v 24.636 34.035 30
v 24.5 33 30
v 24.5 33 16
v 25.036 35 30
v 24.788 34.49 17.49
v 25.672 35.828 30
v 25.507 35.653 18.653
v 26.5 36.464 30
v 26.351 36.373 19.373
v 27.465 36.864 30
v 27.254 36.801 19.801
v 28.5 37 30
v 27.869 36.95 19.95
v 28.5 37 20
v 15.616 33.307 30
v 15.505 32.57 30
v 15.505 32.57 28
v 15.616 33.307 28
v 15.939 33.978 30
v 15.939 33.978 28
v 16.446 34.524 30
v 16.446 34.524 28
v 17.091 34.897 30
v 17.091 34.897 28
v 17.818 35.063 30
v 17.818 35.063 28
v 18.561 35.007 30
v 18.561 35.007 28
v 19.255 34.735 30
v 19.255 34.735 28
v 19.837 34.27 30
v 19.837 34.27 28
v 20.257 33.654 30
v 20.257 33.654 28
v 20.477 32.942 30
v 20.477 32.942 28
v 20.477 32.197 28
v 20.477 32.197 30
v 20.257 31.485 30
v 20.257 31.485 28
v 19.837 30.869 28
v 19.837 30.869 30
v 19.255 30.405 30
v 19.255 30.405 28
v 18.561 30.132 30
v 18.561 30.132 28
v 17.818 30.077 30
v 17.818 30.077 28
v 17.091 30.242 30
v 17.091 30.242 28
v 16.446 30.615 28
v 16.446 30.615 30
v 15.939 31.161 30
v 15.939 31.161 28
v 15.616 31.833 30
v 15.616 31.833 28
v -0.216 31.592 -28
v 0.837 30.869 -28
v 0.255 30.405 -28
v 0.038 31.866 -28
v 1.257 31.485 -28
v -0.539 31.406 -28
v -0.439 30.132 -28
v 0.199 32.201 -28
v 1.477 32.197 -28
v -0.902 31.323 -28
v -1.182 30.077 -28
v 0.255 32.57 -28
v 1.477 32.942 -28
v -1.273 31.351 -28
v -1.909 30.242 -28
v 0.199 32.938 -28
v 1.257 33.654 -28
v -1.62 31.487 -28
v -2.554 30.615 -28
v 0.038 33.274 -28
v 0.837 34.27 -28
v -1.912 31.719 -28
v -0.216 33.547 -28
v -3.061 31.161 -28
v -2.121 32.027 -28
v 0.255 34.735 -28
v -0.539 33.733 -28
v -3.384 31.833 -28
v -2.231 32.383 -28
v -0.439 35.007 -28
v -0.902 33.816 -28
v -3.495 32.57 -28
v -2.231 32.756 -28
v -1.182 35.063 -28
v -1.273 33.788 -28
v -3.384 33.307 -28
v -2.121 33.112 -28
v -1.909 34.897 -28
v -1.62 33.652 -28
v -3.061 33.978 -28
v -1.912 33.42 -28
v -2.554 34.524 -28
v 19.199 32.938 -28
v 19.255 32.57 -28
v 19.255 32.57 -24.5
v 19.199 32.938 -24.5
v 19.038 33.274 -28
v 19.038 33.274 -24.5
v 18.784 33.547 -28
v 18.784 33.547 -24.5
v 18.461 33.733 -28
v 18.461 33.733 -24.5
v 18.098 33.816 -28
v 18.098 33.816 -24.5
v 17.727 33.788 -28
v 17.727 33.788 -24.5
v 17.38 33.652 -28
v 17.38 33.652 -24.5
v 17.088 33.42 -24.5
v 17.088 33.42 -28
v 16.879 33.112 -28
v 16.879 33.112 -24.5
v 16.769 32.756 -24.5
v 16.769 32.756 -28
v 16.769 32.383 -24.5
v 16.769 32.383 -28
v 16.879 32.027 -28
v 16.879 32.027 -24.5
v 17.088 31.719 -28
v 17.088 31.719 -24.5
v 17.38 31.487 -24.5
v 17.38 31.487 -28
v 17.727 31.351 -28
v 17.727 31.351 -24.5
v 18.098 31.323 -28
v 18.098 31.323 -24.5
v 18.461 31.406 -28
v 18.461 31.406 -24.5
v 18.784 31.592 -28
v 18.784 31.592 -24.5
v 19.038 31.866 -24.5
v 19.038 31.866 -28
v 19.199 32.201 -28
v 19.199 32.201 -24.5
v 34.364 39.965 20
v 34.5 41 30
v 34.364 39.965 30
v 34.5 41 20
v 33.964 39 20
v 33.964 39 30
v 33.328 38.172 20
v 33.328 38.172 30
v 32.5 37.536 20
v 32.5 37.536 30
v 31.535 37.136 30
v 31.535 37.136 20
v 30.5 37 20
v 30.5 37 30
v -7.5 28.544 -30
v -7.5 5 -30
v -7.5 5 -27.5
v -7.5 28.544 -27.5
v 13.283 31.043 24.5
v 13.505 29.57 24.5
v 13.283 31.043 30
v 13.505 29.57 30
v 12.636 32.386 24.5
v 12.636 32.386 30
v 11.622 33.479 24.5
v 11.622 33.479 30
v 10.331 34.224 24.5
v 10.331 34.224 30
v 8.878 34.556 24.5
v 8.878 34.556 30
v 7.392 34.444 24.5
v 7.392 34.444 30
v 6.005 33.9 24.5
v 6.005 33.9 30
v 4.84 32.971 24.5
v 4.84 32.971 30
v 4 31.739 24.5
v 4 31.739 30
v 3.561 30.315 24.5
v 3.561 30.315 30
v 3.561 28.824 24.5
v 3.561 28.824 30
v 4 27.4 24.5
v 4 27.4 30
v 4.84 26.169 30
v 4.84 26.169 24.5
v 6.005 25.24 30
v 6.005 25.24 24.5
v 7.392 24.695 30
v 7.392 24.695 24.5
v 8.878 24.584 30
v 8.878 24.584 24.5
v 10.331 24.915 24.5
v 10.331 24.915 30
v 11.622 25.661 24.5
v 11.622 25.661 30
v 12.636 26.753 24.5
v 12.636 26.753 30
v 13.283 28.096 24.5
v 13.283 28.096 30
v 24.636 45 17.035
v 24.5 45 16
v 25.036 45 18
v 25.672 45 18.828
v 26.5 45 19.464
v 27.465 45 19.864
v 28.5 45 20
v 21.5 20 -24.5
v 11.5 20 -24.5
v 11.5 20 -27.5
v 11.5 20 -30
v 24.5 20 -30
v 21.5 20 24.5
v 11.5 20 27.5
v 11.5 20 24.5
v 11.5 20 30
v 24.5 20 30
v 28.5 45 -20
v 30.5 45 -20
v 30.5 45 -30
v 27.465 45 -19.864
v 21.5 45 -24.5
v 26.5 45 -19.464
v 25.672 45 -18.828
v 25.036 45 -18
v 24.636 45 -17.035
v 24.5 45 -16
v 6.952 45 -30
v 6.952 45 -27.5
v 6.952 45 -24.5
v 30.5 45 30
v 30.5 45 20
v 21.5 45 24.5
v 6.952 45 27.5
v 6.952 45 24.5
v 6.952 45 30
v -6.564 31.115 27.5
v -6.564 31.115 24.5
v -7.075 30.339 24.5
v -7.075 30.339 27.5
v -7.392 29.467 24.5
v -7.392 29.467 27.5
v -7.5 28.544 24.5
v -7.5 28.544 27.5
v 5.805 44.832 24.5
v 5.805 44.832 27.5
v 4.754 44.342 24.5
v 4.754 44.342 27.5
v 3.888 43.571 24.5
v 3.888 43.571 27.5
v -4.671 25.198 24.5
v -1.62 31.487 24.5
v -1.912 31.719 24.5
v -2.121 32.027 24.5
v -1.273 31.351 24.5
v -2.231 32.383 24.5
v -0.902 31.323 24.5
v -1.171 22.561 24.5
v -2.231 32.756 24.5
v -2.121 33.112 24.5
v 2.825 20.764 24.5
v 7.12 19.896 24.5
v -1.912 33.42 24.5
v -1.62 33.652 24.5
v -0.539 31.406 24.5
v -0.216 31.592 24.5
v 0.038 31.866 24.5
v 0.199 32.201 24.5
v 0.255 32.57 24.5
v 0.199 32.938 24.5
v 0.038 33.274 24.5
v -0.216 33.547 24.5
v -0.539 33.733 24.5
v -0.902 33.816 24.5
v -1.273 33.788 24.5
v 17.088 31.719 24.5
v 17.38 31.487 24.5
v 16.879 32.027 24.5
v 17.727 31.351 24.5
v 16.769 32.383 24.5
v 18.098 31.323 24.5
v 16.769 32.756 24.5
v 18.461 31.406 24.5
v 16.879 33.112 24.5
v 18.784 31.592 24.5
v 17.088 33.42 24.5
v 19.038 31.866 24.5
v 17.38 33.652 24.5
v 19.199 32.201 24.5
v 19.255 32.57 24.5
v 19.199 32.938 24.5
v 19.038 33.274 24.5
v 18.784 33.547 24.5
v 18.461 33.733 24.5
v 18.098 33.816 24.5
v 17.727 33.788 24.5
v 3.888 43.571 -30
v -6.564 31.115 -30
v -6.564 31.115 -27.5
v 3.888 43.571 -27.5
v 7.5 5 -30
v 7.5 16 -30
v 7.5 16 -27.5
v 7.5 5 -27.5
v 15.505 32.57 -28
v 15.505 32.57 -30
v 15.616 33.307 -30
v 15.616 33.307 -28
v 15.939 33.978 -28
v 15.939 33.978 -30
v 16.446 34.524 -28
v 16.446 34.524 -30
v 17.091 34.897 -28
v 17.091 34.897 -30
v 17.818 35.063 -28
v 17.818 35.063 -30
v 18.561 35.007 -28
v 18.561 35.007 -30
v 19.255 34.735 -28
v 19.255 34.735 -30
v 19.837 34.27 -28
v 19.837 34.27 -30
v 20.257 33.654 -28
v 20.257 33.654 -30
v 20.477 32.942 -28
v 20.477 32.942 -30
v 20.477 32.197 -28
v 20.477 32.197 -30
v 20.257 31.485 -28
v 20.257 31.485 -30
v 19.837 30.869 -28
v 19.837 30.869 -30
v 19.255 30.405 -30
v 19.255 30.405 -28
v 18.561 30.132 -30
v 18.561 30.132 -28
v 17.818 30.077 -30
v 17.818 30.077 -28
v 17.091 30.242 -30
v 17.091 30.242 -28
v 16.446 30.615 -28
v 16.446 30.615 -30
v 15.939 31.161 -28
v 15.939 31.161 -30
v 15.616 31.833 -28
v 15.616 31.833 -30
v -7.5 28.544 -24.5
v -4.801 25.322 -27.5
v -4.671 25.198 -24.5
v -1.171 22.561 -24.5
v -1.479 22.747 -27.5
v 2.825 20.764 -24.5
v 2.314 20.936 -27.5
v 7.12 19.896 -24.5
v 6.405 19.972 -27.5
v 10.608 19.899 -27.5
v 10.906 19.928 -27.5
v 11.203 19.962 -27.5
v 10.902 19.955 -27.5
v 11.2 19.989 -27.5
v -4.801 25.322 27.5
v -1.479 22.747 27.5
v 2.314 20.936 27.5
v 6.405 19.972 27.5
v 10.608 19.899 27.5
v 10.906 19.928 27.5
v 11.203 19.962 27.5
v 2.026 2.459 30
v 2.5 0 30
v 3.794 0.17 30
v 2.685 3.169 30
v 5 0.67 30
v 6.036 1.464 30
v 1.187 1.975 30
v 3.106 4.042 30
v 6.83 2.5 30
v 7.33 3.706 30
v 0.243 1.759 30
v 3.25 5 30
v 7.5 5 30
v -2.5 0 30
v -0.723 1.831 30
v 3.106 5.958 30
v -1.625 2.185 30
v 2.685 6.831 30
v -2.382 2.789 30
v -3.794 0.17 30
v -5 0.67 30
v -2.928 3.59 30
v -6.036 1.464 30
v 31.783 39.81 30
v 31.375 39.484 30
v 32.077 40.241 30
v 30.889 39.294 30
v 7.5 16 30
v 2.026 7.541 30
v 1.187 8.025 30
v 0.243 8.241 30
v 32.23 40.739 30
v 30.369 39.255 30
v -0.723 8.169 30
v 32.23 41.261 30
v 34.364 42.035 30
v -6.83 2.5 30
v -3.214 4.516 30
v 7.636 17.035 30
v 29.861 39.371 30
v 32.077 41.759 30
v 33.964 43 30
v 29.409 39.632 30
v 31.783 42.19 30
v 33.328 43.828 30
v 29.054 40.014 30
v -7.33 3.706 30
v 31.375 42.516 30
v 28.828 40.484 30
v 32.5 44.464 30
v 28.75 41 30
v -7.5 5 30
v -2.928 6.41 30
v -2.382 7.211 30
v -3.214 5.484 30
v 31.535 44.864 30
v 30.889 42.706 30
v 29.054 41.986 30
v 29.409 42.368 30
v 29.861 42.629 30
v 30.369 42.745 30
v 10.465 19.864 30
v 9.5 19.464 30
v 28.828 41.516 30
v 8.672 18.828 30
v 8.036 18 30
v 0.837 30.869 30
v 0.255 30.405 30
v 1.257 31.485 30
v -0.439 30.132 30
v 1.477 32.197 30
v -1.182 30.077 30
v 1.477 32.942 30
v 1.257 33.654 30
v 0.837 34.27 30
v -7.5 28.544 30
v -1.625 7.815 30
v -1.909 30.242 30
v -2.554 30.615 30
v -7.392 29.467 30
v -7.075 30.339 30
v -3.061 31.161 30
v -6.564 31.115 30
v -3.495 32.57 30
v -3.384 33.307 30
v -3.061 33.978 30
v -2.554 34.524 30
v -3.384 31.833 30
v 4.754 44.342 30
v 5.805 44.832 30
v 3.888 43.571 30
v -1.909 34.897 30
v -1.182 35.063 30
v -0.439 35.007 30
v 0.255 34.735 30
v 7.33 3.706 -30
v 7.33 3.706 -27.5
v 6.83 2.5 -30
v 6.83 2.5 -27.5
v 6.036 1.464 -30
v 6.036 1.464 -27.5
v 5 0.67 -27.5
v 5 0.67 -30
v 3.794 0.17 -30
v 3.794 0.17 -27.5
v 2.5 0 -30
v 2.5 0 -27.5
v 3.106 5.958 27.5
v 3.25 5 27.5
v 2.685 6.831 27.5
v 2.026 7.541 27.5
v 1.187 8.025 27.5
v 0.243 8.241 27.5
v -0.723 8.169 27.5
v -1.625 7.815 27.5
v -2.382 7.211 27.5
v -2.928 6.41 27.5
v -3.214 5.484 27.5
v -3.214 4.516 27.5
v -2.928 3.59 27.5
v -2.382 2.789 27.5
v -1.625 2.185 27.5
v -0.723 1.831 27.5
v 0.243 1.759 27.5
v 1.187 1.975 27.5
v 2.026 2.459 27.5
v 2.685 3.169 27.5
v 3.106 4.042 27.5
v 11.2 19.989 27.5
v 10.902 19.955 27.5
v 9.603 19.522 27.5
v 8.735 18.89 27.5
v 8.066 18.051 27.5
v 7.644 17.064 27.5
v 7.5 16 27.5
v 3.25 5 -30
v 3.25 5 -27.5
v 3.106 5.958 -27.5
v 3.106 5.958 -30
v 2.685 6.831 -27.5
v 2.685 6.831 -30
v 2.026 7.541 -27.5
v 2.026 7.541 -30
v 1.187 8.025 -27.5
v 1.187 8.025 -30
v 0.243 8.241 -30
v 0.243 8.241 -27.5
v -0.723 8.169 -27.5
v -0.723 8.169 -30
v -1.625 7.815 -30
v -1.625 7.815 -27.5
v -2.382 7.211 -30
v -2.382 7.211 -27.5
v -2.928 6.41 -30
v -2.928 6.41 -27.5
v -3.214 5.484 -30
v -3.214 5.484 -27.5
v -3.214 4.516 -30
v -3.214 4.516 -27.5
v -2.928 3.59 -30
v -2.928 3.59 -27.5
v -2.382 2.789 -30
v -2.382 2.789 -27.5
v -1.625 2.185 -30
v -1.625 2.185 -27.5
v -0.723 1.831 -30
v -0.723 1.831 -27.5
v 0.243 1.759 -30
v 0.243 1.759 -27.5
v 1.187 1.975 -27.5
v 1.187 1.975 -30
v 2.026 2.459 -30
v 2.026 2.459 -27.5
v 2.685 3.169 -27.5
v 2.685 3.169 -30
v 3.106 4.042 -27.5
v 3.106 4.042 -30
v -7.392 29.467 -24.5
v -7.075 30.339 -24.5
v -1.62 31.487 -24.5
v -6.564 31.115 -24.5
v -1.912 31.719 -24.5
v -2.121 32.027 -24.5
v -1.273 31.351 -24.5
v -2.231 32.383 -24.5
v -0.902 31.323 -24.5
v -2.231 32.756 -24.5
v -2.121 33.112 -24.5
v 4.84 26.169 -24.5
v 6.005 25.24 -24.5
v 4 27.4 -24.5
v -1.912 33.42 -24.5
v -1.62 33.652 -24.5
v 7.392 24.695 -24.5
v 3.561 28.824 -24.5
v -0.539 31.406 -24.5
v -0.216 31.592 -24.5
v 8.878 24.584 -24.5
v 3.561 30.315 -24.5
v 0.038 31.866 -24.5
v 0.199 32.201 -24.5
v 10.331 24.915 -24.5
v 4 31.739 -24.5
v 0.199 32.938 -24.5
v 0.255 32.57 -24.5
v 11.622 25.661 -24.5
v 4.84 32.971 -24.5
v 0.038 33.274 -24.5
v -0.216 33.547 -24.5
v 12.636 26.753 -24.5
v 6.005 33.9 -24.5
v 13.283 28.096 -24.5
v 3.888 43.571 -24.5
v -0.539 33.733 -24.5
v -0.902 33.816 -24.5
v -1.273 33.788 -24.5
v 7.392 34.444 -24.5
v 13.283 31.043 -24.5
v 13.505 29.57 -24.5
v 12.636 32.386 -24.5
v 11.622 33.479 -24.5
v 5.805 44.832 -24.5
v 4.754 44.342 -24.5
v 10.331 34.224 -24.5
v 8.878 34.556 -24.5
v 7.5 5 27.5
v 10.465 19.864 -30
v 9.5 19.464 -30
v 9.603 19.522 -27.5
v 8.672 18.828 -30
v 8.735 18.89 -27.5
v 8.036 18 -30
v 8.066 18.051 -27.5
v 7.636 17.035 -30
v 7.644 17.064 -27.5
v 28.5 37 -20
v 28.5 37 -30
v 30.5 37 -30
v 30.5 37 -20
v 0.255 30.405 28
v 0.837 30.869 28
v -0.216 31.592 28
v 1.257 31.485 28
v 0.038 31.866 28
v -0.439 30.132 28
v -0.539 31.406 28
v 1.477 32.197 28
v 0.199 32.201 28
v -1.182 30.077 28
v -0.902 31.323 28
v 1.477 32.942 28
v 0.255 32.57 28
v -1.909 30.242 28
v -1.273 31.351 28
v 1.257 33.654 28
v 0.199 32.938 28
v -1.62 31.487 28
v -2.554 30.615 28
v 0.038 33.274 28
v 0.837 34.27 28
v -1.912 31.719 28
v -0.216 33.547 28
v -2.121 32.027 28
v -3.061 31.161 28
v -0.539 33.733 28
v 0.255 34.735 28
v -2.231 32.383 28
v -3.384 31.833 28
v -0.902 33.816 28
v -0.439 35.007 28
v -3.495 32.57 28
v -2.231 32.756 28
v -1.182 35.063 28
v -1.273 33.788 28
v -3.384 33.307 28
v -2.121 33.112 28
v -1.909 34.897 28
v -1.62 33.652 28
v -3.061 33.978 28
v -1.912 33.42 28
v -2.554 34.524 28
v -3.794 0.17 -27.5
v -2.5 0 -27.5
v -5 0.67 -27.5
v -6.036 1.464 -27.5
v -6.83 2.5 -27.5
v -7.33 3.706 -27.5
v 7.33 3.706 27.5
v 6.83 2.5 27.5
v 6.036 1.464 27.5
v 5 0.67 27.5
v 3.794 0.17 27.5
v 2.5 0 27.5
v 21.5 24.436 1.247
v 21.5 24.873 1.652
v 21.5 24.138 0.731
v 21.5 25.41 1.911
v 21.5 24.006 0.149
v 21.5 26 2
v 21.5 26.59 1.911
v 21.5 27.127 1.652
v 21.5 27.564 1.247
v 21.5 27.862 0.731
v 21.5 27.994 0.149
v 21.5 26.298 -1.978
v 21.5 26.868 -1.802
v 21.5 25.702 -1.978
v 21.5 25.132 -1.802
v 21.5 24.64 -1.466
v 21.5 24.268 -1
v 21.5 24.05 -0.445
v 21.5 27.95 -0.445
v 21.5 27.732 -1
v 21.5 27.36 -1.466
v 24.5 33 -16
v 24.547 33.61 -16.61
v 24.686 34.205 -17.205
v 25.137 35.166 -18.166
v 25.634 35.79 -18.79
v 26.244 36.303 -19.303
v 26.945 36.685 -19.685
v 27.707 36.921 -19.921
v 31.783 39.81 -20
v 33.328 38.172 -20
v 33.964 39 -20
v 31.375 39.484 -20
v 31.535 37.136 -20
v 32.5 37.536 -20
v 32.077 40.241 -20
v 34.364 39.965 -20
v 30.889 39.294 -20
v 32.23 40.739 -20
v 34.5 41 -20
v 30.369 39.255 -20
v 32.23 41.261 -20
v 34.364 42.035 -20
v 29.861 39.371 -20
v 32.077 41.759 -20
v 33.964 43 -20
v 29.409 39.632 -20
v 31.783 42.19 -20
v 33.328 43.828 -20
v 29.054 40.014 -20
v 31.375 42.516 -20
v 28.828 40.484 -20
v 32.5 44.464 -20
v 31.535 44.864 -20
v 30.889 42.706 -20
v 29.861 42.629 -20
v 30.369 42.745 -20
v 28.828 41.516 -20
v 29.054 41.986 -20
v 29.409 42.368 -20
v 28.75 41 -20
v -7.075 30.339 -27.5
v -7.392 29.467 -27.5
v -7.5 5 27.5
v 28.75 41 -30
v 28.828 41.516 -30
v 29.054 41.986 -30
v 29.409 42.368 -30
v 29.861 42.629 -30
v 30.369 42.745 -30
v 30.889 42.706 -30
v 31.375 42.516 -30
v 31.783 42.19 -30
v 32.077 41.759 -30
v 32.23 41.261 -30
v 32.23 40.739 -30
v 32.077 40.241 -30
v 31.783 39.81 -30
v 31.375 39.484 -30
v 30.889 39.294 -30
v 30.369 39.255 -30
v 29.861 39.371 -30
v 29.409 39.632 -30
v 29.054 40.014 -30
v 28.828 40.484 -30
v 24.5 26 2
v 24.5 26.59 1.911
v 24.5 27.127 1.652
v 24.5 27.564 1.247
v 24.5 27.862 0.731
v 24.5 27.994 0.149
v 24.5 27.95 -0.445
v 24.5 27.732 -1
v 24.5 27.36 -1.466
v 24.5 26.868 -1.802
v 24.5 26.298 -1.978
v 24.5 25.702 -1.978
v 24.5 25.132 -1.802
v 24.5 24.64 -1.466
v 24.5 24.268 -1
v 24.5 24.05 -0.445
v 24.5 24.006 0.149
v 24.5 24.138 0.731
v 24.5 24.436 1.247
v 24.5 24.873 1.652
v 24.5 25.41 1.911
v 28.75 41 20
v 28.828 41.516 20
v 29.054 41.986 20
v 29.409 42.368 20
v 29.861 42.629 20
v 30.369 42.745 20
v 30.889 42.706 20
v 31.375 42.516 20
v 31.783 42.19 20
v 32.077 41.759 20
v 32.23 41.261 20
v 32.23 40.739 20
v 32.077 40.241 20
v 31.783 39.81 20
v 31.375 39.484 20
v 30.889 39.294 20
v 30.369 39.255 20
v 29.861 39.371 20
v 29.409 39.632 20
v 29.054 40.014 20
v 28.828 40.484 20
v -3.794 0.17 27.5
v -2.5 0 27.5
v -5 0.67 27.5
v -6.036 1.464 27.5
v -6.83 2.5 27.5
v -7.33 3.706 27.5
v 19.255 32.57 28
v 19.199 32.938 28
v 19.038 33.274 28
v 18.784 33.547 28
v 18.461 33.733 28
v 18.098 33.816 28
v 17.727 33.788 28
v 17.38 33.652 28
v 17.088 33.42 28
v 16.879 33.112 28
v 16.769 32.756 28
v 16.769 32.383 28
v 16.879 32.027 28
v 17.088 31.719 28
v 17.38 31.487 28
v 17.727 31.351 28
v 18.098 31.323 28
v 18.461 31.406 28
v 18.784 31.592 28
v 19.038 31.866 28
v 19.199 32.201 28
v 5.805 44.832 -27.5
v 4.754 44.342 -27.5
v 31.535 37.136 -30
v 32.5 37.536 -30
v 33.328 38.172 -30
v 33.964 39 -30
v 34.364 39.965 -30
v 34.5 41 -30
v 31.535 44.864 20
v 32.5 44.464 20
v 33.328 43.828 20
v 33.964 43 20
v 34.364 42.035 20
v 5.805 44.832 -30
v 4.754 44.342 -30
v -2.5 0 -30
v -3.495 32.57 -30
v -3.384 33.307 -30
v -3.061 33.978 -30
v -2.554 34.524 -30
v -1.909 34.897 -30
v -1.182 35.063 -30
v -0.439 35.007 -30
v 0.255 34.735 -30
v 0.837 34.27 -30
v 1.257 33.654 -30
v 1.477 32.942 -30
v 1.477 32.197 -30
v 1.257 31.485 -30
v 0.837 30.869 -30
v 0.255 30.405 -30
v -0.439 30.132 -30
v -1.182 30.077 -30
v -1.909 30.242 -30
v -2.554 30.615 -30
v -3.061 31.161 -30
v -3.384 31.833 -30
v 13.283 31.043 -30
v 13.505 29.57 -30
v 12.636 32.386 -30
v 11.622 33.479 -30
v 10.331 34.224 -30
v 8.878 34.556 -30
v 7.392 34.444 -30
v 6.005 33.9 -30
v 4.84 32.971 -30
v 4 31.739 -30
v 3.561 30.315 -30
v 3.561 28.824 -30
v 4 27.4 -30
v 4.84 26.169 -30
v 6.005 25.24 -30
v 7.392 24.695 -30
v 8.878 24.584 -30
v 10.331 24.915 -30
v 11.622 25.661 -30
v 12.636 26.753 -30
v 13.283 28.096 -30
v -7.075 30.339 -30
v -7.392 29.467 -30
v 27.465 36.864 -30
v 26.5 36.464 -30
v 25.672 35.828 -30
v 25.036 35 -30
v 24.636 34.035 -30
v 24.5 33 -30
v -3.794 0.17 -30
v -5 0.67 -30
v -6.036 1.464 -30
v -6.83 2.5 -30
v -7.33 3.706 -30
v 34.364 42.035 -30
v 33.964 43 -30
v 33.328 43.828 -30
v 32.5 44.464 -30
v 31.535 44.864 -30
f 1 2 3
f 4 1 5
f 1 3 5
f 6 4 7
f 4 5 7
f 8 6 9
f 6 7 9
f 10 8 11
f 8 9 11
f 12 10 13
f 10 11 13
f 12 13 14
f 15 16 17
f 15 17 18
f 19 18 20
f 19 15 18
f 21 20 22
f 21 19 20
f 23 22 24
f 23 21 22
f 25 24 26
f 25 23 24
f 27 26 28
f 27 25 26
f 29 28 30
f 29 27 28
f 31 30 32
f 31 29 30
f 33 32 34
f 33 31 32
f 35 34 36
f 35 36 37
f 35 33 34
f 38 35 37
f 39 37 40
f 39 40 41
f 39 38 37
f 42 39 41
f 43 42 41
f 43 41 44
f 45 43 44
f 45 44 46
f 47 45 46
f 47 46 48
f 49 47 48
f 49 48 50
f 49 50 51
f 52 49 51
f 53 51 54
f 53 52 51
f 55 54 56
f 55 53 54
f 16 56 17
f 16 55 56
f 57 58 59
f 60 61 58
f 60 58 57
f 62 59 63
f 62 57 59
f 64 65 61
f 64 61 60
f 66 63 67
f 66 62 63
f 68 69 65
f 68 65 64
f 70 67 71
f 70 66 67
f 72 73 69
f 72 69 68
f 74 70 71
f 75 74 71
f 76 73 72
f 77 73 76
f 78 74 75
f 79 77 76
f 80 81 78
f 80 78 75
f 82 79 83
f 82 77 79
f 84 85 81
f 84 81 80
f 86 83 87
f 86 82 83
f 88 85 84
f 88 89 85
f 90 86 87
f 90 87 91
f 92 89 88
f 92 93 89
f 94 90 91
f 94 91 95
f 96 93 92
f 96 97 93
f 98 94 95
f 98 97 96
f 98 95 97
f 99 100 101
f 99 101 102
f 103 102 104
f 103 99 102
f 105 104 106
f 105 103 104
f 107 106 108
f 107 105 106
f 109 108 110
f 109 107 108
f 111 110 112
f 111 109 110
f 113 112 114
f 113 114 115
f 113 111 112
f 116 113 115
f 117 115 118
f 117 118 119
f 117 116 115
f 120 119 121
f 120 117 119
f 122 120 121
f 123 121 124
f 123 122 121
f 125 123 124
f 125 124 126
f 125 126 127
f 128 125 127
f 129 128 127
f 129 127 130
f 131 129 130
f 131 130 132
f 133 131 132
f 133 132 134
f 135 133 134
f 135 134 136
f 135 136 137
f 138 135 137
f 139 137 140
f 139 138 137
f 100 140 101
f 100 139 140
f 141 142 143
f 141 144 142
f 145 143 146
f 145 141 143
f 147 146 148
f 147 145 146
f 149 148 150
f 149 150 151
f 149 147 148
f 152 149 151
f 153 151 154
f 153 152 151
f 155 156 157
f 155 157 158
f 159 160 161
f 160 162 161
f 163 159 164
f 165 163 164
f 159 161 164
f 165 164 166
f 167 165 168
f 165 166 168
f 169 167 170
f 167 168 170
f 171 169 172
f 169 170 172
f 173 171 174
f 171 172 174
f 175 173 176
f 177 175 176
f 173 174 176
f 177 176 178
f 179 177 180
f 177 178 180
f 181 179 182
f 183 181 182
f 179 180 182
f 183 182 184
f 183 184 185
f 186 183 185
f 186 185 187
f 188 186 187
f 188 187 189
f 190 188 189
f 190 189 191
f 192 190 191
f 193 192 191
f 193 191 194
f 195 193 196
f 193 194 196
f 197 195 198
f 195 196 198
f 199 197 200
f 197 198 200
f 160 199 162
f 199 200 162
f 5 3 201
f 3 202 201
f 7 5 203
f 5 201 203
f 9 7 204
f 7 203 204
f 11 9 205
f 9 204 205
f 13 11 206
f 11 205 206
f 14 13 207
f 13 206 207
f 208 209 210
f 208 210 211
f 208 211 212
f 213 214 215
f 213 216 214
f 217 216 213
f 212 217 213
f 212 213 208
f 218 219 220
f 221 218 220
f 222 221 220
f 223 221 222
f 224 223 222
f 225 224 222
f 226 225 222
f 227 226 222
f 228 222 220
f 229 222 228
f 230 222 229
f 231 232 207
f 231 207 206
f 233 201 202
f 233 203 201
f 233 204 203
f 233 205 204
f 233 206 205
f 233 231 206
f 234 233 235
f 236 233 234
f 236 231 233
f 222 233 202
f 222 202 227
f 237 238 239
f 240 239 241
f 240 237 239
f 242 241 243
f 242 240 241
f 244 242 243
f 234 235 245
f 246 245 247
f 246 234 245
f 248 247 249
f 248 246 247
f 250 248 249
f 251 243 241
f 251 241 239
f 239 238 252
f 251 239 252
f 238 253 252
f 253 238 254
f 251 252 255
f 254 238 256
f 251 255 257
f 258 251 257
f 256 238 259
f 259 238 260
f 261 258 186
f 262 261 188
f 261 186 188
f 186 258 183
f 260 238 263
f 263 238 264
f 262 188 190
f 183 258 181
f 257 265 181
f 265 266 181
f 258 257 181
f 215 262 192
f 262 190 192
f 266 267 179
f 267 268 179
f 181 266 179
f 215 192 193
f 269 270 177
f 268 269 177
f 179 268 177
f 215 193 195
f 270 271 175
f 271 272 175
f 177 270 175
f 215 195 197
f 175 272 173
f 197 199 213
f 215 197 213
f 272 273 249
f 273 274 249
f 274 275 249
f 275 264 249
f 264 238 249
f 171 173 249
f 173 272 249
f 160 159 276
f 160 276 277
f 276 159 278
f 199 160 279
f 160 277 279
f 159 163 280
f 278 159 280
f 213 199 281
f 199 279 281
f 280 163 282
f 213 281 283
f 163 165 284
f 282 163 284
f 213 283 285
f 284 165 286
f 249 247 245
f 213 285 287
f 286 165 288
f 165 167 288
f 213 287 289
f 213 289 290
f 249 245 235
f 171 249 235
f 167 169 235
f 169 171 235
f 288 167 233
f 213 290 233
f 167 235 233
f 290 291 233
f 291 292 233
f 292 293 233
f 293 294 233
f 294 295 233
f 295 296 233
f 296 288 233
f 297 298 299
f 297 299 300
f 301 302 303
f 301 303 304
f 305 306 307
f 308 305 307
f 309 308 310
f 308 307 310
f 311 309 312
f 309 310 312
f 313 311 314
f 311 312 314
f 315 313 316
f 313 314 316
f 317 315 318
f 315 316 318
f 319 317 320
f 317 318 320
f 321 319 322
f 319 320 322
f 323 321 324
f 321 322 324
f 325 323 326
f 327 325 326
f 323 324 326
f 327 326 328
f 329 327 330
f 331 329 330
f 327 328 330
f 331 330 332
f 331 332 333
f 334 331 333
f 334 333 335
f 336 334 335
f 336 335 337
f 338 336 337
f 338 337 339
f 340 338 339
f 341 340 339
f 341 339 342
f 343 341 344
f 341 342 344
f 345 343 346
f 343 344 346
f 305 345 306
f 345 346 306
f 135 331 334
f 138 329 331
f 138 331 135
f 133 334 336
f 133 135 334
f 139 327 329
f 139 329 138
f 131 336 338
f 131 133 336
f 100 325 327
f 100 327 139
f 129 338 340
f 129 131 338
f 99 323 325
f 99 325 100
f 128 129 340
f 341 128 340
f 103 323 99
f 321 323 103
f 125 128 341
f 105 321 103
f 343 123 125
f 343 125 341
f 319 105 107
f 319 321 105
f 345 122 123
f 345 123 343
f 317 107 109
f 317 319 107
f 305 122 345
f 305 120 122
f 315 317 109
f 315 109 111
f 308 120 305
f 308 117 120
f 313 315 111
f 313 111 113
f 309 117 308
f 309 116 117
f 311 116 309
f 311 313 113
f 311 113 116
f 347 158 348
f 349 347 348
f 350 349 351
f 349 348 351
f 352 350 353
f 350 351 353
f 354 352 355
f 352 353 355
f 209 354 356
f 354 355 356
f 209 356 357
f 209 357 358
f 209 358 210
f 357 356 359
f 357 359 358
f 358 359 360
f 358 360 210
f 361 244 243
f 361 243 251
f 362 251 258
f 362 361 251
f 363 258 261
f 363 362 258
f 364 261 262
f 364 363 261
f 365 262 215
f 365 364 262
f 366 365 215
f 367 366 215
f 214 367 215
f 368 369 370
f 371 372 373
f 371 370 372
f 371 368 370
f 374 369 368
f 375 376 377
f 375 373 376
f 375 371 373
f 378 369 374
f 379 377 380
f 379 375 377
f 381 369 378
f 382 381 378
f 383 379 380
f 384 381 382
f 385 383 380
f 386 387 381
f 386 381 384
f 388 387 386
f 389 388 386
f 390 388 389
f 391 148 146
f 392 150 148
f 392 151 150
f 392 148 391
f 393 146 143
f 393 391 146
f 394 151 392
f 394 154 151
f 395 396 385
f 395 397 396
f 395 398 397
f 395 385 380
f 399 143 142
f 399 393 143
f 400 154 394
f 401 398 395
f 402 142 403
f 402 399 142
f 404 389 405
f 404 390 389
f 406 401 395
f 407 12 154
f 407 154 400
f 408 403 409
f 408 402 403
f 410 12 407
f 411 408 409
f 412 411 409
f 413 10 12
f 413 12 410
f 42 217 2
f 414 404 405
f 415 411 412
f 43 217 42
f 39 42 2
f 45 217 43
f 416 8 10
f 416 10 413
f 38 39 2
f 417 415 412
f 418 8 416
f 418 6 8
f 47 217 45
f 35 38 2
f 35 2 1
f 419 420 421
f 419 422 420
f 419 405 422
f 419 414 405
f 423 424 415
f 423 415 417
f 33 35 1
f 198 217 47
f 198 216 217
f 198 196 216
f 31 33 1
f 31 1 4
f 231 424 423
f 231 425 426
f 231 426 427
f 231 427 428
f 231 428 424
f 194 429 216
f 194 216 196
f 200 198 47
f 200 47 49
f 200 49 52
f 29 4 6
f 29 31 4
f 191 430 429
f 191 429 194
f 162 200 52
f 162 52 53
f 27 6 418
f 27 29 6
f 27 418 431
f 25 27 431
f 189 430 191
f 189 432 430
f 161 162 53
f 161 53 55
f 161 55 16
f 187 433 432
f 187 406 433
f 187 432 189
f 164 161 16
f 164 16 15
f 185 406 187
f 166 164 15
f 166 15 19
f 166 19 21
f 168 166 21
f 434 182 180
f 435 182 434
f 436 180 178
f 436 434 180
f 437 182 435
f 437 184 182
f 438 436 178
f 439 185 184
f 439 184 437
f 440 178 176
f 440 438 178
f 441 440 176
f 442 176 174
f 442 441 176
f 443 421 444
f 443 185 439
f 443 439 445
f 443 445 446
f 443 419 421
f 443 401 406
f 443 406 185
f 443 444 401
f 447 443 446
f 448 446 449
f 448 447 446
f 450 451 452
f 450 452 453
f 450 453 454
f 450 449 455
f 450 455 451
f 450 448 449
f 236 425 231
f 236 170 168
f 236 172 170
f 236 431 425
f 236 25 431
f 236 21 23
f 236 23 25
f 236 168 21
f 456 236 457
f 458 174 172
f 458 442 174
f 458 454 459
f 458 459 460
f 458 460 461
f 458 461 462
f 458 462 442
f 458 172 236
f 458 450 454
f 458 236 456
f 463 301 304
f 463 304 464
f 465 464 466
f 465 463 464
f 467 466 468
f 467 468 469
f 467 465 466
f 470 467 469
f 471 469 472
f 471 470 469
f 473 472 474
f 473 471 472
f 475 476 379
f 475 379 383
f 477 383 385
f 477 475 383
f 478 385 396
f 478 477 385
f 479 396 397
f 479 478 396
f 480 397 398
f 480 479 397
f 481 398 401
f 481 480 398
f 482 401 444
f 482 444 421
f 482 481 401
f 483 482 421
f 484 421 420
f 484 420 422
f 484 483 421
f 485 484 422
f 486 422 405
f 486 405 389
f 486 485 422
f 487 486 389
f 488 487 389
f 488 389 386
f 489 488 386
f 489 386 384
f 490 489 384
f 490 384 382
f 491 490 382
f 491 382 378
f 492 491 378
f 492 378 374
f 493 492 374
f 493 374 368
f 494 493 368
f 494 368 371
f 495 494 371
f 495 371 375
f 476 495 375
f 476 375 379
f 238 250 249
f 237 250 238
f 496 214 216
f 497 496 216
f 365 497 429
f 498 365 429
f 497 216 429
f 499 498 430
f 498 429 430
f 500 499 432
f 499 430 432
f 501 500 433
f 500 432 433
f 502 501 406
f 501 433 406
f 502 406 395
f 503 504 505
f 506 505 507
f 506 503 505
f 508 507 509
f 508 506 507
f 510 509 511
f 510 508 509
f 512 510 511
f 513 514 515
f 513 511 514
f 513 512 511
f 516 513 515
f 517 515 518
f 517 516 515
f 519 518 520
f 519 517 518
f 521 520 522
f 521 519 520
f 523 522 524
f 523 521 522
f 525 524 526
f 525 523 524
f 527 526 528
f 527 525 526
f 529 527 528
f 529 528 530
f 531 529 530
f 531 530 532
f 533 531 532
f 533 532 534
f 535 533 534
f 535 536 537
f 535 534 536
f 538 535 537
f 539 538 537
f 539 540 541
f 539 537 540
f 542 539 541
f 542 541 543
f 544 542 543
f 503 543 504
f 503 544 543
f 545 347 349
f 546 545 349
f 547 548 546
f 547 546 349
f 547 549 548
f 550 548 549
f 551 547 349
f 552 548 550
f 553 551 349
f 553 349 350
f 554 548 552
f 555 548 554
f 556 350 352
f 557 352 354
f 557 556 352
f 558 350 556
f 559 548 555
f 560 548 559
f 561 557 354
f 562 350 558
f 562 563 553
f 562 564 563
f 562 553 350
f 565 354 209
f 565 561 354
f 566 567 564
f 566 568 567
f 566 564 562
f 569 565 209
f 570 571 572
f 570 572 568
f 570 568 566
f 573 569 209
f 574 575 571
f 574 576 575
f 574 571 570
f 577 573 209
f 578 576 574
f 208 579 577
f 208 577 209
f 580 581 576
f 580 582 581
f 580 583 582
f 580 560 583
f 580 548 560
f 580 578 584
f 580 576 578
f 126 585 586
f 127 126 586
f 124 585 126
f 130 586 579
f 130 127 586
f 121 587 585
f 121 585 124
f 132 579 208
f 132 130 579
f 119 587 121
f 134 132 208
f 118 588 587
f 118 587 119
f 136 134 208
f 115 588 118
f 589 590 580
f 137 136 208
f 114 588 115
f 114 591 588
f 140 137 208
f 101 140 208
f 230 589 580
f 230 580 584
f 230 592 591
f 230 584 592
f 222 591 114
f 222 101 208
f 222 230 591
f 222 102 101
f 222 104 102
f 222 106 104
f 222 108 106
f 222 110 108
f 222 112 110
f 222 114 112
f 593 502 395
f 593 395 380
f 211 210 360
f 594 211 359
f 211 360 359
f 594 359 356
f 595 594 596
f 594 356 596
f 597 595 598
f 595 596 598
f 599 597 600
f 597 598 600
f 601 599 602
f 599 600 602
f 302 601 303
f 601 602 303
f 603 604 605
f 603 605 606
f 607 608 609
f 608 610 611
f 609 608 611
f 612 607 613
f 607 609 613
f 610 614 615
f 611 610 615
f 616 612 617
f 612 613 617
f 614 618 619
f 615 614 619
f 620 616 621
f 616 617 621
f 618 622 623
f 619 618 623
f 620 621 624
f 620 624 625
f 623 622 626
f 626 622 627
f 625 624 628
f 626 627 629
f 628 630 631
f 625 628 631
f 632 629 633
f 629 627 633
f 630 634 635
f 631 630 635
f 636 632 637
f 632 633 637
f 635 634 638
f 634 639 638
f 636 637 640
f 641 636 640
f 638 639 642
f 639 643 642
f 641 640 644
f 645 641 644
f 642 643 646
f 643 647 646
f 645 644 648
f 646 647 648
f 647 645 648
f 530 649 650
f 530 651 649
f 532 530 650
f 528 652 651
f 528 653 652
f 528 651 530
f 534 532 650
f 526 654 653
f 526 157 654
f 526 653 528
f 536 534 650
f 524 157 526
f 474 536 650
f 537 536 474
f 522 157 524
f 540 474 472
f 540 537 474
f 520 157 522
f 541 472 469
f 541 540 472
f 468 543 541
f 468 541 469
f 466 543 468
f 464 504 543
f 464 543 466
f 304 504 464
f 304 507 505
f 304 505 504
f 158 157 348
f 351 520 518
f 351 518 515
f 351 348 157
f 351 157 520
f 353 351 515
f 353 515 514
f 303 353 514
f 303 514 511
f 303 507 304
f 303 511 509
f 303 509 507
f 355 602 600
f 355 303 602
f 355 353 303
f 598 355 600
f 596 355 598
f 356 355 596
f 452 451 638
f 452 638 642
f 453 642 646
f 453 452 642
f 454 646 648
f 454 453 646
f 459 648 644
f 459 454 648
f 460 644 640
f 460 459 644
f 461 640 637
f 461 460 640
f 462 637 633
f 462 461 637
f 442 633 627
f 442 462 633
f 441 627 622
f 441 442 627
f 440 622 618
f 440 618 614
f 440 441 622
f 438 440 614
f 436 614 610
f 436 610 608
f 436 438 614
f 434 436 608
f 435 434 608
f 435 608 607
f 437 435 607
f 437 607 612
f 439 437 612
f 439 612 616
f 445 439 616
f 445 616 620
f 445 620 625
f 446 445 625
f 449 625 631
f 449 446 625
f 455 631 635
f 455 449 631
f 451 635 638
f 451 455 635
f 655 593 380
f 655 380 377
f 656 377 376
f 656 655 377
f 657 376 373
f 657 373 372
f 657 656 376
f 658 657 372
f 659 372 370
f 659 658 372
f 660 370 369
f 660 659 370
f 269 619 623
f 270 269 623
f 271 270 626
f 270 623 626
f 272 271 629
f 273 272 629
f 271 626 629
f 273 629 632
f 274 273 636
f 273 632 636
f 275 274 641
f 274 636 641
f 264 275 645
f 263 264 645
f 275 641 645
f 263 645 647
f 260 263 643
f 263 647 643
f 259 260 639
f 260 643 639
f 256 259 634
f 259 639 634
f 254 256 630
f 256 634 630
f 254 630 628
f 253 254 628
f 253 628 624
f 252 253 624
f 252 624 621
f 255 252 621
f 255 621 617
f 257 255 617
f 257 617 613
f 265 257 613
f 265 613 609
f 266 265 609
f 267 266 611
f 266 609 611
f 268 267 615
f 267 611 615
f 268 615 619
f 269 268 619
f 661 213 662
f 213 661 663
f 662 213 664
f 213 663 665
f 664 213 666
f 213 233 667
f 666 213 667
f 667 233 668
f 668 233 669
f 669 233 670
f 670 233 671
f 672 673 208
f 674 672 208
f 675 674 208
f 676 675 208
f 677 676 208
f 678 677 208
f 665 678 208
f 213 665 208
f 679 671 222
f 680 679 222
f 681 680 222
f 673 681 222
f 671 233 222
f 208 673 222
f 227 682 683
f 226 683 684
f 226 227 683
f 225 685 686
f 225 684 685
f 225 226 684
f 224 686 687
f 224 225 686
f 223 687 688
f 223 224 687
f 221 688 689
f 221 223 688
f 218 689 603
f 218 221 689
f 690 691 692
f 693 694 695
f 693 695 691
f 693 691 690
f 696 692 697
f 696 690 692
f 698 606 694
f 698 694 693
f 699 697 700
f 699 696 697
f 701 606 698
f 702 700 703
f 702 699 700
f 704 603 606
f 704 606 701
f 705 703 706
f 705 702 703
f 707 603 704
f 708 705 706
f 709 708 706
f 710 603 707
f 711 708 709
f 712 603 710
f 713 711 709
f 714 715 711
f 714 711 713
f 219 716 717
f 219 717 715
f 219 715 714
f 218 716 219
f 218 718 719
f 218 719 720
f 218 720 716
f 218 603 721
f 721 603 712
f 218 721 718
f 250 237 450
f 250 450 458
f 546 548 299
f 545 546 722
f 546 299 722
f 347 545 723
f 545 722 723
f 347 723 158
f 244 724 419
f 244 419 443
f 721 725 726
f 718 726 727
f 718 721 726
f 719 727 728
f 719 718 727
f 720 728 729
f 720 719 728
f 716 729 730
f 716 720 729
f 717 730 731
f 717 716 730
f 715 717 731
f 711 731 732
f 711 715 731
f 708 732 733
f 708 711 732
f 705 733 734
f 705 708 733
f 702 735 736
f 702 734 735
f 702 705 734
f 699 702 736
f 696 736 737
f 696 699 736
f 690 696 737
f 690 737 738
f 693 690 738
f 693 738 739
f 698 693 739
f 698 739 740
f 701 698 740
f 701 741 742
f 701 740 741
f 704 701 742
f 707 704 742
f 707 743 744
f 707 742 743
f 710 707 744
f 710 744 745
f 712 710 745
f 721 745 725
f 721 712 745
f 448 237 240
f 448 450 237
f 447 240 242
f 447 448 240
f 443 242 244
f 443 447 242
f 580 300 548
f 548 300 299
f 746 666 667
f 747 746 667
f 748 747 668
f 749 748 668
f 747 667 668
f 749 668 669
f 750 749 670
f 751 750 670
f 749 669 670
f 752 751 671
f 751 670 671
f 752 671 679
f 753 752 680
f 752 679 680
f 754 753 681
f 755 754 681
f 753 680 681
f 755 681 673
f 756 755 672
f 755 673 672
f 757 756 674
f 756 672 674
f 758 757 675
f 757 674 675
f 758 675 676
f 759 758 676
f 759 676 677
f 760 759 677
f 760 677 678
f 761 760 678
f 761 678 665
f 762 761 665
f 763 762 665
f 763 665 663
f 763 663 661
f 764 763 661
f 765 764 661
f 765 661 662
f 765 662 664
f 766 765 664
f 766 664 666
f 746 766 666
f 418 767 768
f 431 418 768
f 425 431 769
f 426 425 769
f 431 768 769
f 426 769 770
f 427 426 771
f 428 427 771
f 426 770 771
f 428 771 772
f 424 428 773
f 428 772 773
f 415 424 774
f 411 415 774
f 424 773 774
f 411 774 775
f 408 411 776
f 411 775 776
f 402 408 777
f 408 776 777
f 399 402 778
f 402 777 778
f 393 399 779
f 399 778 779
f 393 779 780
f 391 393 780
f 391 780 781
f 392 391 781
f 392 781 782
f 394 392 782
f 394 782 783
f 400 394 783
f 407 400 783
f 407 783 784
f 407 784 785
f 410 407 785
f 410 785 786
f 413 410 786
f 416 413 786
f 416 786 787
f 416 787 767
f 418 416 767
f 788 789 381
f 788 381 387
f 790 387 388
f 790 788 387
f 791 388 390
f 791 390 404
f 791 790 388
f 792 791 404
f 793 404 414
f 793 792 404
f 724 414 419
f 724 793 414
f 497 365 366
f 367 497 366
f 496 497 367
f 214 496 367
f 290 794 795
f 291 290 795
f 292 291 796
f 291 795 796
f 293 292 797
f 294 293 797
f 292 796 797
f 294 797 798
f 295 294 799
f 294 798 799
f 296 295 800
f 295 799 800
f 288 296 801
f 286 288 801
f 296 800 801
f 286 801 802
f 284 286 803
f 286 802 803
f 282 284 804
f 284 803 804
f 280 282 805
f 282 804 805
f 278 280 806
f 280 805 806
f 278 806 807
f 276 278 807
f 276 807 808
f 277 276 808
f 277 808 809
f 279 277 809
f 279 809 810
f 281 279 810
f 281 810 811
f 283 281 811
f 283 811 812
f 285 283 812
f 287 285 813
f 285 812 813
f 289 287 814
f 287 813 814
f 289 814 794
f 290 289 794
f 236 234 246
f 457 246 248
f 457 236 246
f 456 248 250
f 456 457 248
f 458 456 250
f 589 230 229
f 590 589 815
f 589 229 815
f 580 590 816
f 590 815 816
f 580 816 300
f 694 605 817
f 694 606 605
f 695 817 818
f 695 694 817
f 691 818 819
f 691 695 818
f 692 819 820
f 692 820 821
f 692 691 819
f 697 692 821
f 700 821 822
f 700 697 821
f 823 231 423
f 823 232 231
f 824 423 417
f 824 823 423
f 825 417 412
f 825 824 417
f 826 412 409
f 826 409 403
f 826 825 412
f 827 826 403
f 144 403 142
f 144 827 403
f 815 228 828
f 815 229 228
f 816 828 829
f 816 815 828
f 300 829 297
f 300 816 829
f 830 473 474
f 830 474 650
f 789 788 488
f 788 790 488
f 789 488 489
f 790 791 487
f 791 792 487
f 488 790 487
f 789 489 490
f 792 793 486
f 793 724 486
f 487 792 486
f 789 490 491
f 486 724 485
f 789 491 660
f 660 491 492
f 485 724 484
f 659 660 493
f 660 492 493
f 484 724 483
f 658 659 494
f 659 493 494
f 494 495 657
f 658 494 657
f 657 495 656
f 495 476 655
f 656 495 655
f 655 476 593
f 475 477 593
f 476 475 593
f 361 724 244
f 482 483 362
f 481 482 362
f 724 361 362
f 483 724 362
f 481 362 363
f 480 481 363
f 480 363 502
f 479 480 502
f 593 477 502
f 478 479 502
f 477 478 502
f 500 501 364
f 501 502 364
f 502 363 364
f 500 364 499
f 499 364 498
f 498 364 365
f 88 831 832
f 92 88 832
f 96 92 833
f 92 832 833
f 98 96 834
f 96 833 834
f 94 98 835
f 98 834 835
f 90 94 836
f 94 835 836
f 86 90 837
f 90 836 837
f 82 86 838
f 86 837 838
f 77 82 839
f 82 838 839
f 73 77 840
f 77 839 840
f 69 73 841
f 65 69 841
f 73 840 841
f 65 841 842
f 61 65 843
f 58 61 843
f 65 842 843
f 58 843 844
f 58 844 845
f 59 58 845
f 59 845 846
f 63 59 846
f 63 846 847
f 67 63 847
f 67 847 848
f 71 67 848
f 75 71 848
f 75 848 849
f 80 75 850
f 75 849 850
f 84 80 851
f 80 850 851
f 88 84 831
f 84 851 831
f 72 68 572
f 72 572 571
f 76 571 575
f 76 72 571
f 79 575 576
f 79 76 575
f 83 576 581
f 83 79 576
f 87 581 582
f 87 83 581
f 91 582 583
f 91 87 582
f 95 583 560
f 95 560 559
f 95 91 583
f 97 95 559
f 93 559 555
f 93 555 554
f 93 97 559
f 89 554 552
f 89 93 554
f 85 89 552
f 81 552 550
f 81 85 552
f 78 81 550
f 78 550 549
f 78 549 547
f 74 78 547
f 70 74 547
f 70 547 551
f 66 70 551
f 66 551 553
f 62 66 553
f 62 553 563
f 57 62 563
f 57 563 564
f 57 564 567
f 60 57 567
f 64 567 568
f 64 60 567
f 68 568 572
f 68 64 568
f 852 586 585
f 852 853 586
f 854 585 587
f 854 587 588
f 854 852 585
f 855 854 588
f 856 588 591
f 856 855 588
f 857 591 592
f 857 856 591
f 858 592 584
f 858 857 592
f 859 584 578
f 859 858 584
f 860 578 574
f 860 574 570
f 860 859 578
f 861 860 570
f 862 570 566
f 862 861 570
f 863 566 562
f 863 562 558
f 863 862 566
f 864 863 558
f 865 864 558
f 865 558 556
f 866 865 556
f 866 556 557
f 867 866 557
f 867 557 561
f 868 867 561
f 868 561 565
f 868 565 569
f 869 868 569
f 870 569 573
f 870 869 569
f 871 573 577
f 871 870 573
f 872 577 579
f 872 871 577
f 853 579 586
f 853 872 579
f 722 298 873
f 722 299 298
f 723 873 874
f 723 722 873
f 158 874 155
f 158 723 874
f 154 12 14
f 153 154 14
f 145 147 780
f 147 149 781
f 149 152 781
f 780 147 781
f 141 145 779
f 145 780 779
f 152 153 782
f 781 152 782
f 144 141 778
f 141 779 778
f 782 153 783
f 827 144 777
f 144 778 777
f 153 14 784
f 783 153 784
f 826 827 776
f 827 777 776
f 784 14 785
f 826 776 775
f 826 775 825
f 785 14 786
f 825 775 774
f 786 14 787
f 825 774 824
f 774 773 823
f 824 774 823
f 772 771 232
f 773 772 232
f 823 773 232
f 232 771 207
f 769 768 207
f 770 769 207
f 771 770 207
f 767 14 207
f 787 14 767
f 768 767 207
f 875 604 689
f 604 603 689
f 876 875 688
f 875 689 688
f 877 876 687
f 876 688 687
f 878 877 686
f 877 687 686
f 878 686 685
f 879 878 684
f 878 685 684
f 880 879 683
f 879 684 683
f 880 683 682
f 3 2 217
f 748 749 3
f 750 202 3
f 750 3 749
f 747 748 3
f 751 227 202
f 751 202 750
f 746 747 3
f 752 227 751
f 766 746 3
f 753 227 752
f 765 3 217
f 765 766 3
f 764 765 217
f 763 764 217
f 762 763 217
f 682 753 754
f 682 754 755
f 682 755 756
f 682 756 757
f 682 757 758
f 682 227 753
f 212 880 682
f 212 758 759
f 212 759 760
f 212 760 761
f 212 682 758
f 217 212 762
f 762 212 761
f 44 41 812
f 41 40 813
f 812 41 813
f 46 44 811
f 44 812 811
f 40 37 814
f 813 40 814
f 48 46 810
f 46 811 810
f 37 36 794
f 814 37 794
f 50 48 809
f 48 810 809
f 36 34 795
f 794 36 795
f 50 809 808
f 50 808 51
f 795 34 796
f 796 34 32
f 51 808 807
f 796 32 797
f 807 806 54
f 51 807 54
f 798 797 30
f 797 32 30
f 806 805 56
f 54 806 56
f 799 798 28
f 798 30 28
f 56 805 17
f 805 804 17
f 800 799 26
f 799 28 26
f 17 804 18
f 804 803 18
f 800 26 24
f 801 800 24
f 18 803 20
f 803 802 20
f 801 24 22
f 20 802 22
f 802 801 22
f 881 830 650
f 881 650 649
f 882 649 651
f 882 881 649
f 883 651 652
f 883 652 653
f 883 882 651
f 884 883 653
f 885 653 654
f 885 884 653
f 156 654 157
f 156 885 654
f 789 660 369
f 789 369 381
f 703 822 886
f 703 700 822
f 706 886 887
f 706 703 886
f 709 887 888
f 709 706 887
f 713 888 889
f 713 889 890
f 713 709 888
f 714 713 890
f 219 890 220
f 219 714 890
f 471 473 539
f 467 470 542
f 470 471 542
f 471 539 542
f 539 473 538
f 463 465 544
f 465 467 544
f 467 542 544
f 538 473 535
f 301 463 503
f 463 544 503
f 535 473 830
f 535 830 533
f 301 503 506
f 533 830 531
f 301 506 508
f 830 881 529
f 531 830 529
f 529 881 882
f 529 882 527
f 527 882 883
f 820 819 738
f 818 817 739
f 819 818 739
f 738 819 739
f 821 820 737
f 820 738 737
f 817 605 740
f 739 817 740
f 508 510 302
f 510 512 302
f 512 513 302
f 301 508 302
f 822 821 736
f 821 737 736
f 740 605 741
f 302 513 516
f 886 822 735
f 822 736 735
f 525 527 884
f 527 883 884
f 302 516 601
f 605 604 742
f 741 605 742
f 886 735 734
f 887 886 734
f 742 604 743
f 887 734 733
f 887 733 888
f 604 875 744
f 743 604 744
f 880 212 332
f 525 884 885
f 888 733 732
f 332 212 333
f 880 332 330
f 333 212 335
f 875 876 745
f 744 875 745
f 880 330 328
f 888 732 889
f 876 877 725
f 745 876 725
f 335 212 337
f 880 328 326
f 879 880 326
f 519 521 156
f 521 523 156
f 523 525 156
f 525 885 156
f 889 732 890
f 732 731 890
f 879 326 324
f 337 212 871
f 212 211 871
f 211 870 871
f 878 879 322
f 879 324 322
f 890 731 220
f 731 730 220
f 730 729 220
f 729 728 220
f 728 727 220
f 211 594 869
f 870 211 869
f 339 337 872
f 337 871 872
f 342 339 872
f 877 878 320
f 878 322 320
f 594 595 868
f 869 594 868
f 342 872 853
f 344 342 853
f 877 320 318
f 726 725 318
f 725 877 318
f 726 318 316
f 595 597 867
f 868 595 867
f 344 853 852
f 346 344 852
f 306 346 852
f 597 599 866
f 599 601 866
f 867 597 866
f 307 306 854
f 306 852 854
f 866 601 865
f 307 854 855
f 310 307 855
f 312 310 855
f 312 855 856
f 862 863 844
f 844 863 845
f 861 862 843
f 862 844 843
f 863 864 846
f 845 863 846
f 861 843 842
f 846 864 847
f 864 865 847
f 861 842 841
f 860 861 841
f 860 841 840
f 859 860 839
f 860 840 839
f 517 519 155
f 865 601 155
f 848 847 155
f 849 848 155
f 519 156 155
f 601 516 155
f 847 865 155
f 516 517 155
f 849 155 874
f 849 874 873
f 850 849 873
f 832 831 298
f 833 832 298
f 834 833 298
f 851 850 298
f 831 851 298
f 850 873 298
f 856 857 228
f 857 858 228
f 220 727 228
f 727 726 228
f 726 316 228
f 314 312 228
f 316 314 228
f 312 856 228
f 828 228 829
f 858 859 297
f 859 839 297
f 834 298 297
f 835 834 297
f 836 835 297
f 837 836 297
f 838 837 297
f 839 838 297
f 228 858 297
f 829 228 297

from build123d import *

# Parameters (mm, degrees)
BOSS_EXTRUDE1_DEPTH      = 30
BOSS_EXTRUDE1_DEPTH_BACK = 30
SKETCH2_R                = 3.25
SKETCH2_R_2              = 1.25
SKETCH2_R_3              = 5
SKETCH3_W                = 58
SKETCH3_H                = 55
CUT_EXTRUDE1_DEPTH       = 60.373815778
SKETCH4_W                = 10
SKETCH4_H                = 8
BOSS_EXTRUDE2_DEPTH      = 10
FILLET1_R                = 4
SKETCH5_R                = 1.75
CUT_EXTRUDE2_DEPTH       = 76.599272483
FILLET1_OF_MIRROR1_R     = 4
FILLET2_R                = 4
SKETCH6_R                = 1.25
SKETCH6_R_2              = 5
BOSS_EXTRUDE3_DEPTH      = 3
SKETCH7_R                = 2.5
CUT_EXTRUDE3_DEPTH       = 2
SKETCH8_R                = 2
CUT_EXTRUDE4_DEPTH       = 62.36774397


with BuildPart() as part:
    # Sketch2 → Boss-Extrude1 (new, two sides: drawn at the far end of the back side and taken through both)
    with BuildSketch(Plane.XY.offset(-BOSS_EXTRUDE1_DEPTH_BACK)):
        with BuildLine():
            Line((-7.5, 5), (-7.5, 30))
            Line((-7.5, 30), (5.086494468, 45))
            Line((5.086494468, 45), (24.5, 45))
            Line((24.5, 45), (24.5, 20))
            Line((24.5, 20), (7.5, 20))
            Line((7.5, 20), (7.5, 5))
            ThreePointArc((7.5, 5), (6.035533906, 1.464466094), (2.5, 0))
            Line((2.5, 0), (-2.5, 0))
            ThreePointArc((-2.5, 0), (-6.035533906, 1.464466094), (-7.5, 5))
        make_face()
        with Locations((0, 5)):
            Circle(SKETCH2_R, mode=Mode.SUBTRACT)
        with Locations((18.004770913, 32.569673822)):
            Circle(SKETCH2_R_2, mode=Mode.SUBTRACT)
        with Locations((-0.995229087, 32.569673822)):
            Circle(SKETCH2_R_2, mode=Mode.SUBTRACT)
        with Locations((8.504770913, 29.569673822)):
            Circle(SKETCH2_R_3, mode=Mode.SUBTRACT)
    extrude(amount=BOSS_EXTRUDE1_DEPTH + BOSS_EXTRUDE1_DEPTH_BACK)

    # Sketch3 → Cut-Extrude1 (cut, through all)
    with BuildSketch(Plane(origin=(0, 45, 0), x_dir=(1, 0, 0), z_dir=(0, 1, 0))):
        with Locations((-7.5, 0)):
            Rectangle(SKETCH3_W, SKETCH3_H)
    extrude(amount=-CUT_EXTRUDE1_DEPTH, mode=Mode.SUBTRACT)

    # Sketch4 → Boss-Extrude2 (add)
    with BuildSketch(Plane(origin=(24.5, 0, 0), x_dir=(0, 0, -1), z_dir=(1, 0, 0))):
        with Locations((-25, 41)):
            Rectangle(SKETCH4_W, SKETCH4_H)
    boss_extrude2 = extrude(amount=BOSS_EXTRUDE2_DEPTH)

    # Fillet1
    fillet1_edges = [part.edges().sort_by_distance(p)[0] for p in [
        (34.5, 37, 25),
        (34.5, 45, 25),
    ]]
    fillet(fillet1_edges, radius=FILLET1_R - 0.0001)  # a hair under: the kernel refuses the full size

    # Sketch5 → Cut-Extrude2 (cut, through all)
    with BuildSketch(Plane(origin=(0, 0, 20), x_dir=(-1, 0, 0), z_dir=(0, 0, -1))):
        with Locations((-30.5, 41)):
            Circle(SKETCH5_R)
    cut_extrude2 = extrude(amount=-CUT_EXTRUDE2_DEPTH, mode=Mode.SUBTRACT)

    # Mirror1: Boss-Extrude2, Cut-Extrude2 across plane
    add(boss_extrude2.mirror(Plane.XY))
    add(cut_extrude2.mirror(Plane.XY), mode=Mode.SUBTRACT)

    # Fillet1 of Mirror1
    fillet1_of_mirror1_edges = [part.edges().sort_by_distance(p)[0] for p in [
        (34.5, 37, -25),
        (34.5, 45, -25),
    ]]
    fillet(fillet1_of_mirror1_edges, radius=FILLET1_OF_MIRROR1_R - 0.0001)  # a hair under: the kernel refuses the full size

    # Fillet2
    fillet2_edges = [part.edges().sort_by_distance(p)[0] for p in [
        (24.5, 37, 25),
        (24.5, 41, 20),
        (24.5, 37, -25),
        (24.5, 41, -20),
        (5.086494468, 45, -28.75),
        (7.5, 20, -28.75),
        (-7.5, 30, -28.75),
        (-7.5, 30, 28.75),
        (7.5, 20, 28.75),
        (5.086494468, 45, 28.75),
    ]]
    fillet(fillet2_edges, radius=FILLET2_R)

    # Sketch6 → Boss-Extrude3 (add)
    with BuildSketch(Plane.XY.offset(-27.5)):
        with BuildLine():
            Line((21.5, 45), (6.9517251, 45))
            ThreePointArc((6.9517251, 45), (5.261252053, 44.625231148), (3.887547328, 43.571150439))
            Line((3.887547328, 43.571150439), (-6.564177772, 31.115269502))
            ThreePointArc((-6.564177772, 31.115269502), (-7.258770483, 29.912199636), (-7.5, 28.544119063))
            ThreePointArc((-7.5, 28.544119063), (0.776489044, 21.551274863), (11.5, 20))
            Line((11.5, 20), (21.5, 20))
            Line((21.5, 20), (21.5, 45))
        make_face()
        with Locations((18.004770913, 32.569673822)):
            Circle(SKETCH6_R, mode=Mode.SUBTRACT)
        with Locations((8.504770913, 29.569673822)):
            Circle(SKETCH6_R_2, mode=Mode.SUBTRACT)
        with Locations((-0.995229087, 32.569673822)):
            Circle(SKETCH6_R, mode=Mode.SUBTRACT)
    boss_extrude3 = extrude(amount=BOSS_EXTRUDE3_DEPTH)

    # Sketch7 → Cut-Extrude3 (cut)
    with BuildSketch(Plane(origin=(0, 0, -30), x_dir=(-1, 0, 0), z_dir=(0, 0, -1))):
        with Locations((-18.004770913, 32.569673822)):
            Circle(SKETCH7_R)
        with Locations((0.995229087, 32.569673822)):
            Circle(SKETCH7_R)
    cut_extrude3 = extrude(amount=-CUT_EXTRUDE3_DEPTH, mode=Mode.SUBTRACT)

    # Mirror2: Boss-Extrude3, Cut-Extrude3 across plane
    add(boss_extrude3.mirror(Plane.XY))
    add(cut_extrude3.mirror(Plane.XY), mode=Mode.SUBTRACT)

    # Sketch8 → Cut-Extrude4 (cut, through all)
    with BuildSketch(Plane.ZY.offset(-21.5)):
        with Locations((0, 26)):
            Circle(SKETCH8_R)
    extrude(amount=-CUT_EXTRUDE4_DEPTH, mode=Mode.SUBTRACT)


solid = part.part
